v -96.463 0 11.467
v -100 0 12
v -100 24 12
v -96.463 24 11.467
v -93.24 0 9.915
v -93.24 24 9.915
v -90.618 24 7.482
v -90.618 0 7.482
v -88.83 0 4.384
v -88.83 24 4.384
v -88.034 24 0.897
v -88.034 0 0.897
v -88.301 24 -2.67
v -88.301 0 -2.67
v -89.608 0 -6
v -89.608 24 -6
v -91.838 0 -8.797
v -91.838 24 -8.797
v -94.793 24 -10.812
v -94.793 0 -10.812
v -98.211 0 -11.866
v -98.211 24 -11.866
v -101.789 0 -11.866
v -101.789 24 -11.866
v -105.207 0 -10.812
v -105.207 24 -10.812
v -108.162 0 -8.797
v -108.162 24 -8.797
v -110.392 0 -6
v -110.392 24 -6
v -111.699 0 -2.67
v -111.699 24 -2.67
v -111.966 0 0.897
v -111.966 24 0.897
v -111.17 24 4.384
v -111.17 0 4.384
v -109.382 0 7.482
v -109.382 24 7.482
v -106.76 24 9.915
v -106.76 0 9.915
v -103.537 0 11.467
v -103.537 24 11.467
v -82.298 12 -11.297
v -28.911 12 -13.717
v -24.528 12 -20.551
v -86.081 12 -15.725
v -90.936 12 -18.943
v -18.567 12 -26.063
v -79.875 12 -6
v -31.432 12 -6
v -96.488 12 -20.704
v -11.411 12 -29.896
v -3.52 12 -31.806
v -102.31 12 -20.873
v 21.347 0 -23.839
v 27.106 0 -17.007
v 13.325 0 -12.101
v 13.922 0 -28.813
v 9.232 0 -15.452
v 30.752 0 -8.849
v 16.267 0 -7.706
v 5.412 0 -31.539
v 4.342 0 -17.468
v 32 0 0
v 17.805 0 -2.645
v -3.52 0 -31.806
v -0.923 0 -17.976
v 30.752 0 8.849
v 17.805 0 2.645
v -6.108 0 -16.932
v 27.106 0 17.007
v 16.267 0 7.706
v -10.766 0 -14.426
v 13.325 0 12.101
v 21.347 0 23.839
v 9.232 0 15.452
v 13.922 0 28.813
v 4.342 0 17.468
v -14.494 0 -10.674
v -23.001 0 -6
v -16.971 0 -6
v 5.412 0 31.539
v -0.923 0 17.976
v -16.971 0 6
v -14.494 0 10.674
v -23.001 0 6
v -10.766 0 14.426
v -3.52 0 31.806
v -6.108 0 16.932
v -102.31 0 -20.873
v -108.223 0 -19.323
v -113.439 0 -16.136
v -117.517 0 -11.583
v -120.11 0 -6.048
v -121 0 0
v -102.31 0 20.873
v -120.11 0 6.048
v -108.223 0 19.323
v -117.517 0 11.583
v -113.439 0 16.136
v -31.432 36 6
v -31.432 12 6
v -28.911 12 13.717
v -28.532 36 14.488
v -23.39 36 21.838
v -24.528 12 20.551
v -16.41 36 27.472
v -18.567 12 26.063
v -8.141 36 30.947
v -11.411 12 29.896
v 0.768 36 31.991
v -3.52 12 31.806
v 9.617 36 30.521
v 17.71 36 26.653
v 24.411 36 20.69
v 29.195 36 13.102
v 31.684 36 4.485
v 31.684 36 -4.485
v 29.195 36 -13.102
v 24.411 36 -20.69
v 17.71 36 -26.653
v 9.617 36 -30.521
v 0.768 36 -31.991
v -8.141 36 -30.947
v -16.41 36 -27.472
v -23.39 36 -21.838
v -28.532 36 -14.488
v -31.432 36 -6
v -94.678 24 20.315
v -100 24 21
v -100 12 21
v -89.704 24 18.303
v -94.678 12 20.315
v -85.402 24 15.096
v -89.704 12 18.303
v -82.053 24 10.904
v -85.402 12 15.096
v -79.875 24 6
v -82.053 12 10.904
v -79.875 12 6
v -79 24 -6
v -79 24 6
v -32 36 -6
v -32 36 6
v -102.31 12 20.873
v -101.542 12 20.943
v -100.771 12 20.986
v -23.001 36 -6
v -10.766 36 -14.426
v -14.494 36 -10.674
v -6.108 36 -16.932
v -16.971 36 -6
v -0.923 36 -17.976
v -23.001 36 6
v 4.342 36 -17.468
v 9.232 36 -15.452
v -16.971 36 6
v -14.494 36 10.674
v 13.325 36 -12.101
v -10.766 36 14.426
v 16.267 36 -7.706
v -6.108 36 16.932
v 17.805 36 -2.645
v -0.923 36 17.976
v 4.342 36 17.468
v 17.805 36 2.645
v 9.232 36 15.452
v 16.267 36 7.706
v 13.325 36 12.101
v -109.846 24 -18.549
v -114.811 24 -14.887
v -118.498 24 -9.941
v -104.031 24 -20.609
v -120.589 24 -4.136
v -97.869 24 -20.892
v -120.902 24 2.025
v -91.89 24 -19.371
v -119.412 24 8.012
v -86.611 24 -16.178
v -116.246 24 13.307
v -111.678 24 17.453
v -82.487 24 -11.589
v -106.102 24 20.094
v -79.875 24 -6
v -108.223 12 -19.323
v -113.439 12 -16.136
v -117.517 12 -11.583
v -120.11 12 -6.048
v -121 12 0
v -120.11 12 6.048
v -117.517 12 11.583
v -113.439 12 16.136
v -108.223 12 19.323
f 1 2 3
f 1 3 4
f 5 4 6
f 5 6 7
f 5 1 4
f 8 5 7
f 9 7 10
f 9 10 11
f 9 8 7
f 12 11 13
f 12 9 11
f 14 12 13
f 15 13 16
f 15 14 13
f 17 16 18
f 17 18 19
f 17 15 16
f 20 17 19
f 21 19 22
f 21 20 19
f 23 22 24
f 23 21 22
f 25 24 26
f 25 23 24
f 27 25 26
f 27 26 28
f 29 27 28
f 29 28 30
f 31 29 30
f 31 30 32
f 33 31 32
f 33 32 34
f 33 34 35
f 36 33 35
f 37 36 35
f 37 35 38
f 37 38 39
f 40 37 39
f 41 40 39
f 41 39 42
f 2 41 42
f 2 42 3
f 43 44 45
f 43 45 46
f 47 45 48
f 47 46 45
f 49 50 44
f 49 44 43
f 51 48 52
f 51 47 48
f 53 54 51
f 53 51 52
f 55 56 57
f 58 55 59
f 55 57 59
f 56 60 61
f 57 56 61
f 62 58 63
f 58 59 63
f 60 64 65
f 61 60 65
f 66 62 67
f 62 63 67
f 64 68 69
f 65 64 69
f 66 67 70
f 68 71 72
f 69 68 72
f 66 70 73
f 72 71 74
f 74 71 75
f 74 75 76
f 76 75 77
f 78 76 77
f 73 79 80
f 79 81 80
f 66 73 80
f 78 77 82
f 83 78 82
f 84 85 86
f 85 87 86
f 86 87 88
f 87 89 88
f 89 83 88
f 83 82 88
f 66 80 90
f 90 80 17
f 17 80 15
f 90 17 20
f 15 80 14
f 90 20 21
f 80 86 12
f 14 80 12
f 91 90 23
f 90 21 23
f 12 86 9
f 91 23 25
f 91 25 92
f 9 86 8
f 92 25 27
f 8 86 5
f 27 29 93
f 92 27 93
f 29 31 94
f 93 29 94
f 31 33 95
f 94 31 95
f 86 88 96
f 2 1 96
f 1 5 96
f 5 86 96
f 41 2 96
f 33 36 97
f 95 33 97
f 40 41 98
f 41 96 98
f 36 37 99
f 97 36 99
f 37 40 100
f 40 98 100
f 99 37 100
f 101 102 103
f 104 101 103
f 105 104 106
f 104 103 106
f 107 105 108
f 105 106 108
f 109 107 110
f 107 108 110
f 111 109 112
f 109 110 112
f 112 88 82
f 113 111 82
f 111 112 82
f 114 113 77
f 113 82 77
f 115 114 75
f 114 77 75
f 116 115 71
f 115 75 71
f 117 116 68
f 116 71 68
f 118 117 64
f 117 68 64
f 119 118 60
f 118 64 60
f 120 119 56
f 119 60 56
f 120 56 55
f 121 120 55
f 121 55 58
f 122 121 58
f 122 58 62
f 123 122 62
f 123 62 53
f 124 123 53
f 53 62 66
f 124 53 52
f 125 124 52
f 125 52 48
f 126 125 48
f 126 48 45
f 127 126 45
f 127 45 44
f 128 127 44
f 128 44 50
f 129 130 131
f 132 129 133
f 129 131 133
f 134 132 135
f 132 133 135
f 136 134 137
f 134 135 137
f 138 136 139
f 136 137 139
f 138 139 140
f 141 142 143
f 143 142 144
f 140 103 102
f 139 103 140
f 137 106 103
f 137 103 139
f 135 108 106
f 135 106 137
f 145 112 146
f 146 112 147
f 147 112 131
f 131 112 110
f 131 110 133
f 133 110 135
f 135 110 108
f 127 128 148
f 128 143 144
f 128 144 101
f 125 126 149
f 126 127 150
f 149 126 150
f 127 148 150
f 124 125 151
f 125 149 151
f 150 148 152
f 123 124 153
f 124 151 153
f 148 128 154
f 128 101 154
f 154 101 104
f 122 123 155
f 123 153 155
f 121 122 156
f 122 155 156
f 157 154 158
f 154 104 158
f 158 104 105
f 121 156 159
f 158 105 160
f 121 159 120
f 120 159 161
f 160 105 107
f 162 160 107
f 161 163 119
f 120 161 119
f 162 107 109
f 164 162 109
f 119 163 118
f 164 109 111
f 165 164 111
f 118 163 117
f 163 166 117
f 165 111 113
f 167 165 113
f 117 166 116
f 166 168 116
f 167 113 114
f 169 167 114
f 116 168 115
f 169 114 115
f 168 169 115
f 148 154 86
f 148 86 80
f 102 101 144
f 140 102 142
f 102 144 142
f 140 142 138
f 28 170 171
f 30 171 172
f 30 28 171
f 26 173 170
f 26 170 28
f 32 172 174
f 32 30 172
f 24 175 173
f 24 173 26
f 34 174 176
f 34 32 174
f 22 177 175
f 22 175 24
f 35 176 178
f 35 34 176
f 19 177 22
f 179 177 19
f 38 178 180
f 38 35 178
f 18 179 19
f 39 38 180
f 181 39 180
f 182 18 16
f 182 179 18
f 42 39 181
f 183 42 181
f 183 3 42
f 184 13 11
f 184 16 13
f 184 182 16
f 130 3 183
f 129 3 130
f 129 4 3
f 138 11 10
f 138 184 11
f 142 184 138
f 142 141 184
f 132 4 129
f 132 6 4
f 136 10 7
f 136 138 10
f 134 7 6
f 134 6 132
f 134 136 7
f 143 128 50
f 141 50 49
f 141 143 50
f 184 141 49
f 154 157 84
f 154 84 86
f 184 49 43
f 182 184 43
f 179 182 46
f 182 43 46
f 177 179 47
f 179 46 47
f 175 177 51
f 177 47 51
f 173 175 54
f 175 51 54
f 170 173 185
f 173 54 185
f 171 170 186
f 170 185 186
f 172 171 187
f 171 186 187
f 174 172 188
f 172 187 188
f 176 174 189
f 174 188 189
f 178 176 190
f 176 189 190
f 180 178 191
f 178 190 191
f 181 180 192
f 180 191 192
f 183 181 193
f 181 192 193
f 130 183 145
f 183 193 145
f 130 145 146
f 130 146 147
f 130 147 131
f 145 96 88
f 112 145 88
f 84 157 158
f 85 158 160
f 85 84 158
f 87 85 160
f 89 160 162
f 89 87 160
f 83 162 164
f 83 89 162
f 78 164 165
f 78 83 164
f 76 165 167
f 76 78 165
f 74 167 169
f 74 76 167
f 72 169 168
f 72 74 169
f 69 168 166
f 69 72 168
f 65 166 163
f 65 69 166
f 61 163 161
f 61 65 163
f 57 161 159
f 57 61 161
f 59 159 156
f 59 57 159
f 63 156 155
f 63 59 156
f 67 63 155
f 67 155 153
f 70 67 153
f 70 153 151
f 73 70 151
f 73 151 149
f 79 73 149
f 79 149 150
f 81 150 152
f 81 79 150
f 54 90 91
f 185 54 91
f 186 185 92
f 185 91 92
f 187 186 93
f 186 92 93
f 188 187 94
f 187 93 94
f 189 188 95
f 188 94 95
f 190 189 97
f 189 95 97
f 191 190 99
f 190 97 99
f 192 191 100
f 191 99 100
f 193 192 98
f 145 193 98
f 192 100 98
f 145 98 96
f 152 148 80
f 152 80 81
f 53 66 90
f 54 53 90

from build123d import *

# Parameters (mm, degrees)
SKETCH1_R           = 32
SKETCH1_R_2         = 18
BOSS_EXTRUDE1_DEPTH = 36
SKETCH2_R           = 21
SKETCH2_R_2         = 12
BOSS_EXTRUDE2_DEPTH = 24
SKETCH3_R           = 18
SKETCH3_R_2         = 12
BOSS_EXTRUDE3_DEPTH = 12
CUT_EXTRUDE1_DEPTH  = 131.234404057
BOSS_EXTRUDE4_DEPTH = 6


with BuildPart() as part:
    # Sketch1 → Boss-Extrude1 (new body)
    with BuildSketch(Plane(origin=(0, 0, 0), x_dir=(1, 0, 0), z_dir=(0, 1, 0))):
        with Locations(Location((0, 0, 0), (0, 0, 270))):
            Circle(SKETCH1_R)
        with Locations(Location((0, 0, 0), (0, 0, 270))):
            Circle(SKETCH1_R_2, mode=Mode.SUBTRACT)
    extrude(amount=BOSS_EXTRUDE1_DEPTH)



with BuildPart() as body_2:
    # Sketch2 → Boss-Extrude2 (new body)
    with BuildSketch(Plane(origin=(0, 0, 0), x_dir=(1, 0, 0), z_dir=(0, 1, 0))):
        with Locations(Location((-100, 0, 0), (0, 0, 270))):
            Circle(SKETCH2_R)
        with Locations(Location((-100, 0, 0), (0, 0, 270))):
            Circle(SKETCH2_R_2, mode=Mode.SUBTRACT)
    extrude(amount=BOSS_EXTRUDE2_DEPTH)


with BuildPart() as part_1:
    add(part.part)

    add(body_2.part)  # Boss-Extrude3 merges body 2
    # Sketch3 → Boss-Extrude3 (add)
    with BuildSketch(Plane.XZ):
        with BuildLine():
            Line((-102.31, 20.872563331), (-3.52, 31.80581079))
            ThreePointArc((-3.52, 31.80581079), (32, 0), (-3.52, -31.80581079))
            Line((-3.52, -31.80581079), (-102.31, -20.872563331))
            ThreePointArc((-102.31, -20.872563331), (-121, 0), (-102.31, 20.872563331))
        make_face()
        with Locations(Location((0, 0, 0), (0, 0, 90))):
            Circle(SKETCH3_R, mode=Mode.SUBTRACT)
        with Locations(Location((-100, 0, 0), (0, 0, 270))):
            Circle(SKETCH3_R_2, mode=Mode.SUBTRACT)
    extrude(amount=-BOSS_EXTRUDE3_DEPTH)

    # Sketch4 → Cut-Extrude1 (cut, through all)
    with BuildSketch(Plane(origin=(0, 36, 0), x_dir=(1, 0, 0), z_dir=(0, 1, 0))):
        with BuildLine():
            Line((-23.000562748, 6), (-16.970562748, 6))
            ThreePointArc((-16.970562748, 6), (-18, 0), (-16.970562748, -6))
            Line((-16.970562748, -6), (-23.000562748, -6))
            Line((-23.000562748, -6), (-23.000562748, 6))
        make_face()
    extrude(amount=-CUT_EXTRUDE1_DEPTH, mode=Mode.SUBTRACT)

    # Sketch5 → Boss-Extrude4 (add, symmetric)
    with BuildSketch(Plane.XY):
        Polygon((-80.173004722, 12), (-80.173004722, 24), (-79, 24), (-32, 36), (-30.333655542, 36), (-30.333655542, 12), align=None)
    extrude(amount=BOSS_EXTRUDE4_DEPTH, both=True)


solid = part_1.part
